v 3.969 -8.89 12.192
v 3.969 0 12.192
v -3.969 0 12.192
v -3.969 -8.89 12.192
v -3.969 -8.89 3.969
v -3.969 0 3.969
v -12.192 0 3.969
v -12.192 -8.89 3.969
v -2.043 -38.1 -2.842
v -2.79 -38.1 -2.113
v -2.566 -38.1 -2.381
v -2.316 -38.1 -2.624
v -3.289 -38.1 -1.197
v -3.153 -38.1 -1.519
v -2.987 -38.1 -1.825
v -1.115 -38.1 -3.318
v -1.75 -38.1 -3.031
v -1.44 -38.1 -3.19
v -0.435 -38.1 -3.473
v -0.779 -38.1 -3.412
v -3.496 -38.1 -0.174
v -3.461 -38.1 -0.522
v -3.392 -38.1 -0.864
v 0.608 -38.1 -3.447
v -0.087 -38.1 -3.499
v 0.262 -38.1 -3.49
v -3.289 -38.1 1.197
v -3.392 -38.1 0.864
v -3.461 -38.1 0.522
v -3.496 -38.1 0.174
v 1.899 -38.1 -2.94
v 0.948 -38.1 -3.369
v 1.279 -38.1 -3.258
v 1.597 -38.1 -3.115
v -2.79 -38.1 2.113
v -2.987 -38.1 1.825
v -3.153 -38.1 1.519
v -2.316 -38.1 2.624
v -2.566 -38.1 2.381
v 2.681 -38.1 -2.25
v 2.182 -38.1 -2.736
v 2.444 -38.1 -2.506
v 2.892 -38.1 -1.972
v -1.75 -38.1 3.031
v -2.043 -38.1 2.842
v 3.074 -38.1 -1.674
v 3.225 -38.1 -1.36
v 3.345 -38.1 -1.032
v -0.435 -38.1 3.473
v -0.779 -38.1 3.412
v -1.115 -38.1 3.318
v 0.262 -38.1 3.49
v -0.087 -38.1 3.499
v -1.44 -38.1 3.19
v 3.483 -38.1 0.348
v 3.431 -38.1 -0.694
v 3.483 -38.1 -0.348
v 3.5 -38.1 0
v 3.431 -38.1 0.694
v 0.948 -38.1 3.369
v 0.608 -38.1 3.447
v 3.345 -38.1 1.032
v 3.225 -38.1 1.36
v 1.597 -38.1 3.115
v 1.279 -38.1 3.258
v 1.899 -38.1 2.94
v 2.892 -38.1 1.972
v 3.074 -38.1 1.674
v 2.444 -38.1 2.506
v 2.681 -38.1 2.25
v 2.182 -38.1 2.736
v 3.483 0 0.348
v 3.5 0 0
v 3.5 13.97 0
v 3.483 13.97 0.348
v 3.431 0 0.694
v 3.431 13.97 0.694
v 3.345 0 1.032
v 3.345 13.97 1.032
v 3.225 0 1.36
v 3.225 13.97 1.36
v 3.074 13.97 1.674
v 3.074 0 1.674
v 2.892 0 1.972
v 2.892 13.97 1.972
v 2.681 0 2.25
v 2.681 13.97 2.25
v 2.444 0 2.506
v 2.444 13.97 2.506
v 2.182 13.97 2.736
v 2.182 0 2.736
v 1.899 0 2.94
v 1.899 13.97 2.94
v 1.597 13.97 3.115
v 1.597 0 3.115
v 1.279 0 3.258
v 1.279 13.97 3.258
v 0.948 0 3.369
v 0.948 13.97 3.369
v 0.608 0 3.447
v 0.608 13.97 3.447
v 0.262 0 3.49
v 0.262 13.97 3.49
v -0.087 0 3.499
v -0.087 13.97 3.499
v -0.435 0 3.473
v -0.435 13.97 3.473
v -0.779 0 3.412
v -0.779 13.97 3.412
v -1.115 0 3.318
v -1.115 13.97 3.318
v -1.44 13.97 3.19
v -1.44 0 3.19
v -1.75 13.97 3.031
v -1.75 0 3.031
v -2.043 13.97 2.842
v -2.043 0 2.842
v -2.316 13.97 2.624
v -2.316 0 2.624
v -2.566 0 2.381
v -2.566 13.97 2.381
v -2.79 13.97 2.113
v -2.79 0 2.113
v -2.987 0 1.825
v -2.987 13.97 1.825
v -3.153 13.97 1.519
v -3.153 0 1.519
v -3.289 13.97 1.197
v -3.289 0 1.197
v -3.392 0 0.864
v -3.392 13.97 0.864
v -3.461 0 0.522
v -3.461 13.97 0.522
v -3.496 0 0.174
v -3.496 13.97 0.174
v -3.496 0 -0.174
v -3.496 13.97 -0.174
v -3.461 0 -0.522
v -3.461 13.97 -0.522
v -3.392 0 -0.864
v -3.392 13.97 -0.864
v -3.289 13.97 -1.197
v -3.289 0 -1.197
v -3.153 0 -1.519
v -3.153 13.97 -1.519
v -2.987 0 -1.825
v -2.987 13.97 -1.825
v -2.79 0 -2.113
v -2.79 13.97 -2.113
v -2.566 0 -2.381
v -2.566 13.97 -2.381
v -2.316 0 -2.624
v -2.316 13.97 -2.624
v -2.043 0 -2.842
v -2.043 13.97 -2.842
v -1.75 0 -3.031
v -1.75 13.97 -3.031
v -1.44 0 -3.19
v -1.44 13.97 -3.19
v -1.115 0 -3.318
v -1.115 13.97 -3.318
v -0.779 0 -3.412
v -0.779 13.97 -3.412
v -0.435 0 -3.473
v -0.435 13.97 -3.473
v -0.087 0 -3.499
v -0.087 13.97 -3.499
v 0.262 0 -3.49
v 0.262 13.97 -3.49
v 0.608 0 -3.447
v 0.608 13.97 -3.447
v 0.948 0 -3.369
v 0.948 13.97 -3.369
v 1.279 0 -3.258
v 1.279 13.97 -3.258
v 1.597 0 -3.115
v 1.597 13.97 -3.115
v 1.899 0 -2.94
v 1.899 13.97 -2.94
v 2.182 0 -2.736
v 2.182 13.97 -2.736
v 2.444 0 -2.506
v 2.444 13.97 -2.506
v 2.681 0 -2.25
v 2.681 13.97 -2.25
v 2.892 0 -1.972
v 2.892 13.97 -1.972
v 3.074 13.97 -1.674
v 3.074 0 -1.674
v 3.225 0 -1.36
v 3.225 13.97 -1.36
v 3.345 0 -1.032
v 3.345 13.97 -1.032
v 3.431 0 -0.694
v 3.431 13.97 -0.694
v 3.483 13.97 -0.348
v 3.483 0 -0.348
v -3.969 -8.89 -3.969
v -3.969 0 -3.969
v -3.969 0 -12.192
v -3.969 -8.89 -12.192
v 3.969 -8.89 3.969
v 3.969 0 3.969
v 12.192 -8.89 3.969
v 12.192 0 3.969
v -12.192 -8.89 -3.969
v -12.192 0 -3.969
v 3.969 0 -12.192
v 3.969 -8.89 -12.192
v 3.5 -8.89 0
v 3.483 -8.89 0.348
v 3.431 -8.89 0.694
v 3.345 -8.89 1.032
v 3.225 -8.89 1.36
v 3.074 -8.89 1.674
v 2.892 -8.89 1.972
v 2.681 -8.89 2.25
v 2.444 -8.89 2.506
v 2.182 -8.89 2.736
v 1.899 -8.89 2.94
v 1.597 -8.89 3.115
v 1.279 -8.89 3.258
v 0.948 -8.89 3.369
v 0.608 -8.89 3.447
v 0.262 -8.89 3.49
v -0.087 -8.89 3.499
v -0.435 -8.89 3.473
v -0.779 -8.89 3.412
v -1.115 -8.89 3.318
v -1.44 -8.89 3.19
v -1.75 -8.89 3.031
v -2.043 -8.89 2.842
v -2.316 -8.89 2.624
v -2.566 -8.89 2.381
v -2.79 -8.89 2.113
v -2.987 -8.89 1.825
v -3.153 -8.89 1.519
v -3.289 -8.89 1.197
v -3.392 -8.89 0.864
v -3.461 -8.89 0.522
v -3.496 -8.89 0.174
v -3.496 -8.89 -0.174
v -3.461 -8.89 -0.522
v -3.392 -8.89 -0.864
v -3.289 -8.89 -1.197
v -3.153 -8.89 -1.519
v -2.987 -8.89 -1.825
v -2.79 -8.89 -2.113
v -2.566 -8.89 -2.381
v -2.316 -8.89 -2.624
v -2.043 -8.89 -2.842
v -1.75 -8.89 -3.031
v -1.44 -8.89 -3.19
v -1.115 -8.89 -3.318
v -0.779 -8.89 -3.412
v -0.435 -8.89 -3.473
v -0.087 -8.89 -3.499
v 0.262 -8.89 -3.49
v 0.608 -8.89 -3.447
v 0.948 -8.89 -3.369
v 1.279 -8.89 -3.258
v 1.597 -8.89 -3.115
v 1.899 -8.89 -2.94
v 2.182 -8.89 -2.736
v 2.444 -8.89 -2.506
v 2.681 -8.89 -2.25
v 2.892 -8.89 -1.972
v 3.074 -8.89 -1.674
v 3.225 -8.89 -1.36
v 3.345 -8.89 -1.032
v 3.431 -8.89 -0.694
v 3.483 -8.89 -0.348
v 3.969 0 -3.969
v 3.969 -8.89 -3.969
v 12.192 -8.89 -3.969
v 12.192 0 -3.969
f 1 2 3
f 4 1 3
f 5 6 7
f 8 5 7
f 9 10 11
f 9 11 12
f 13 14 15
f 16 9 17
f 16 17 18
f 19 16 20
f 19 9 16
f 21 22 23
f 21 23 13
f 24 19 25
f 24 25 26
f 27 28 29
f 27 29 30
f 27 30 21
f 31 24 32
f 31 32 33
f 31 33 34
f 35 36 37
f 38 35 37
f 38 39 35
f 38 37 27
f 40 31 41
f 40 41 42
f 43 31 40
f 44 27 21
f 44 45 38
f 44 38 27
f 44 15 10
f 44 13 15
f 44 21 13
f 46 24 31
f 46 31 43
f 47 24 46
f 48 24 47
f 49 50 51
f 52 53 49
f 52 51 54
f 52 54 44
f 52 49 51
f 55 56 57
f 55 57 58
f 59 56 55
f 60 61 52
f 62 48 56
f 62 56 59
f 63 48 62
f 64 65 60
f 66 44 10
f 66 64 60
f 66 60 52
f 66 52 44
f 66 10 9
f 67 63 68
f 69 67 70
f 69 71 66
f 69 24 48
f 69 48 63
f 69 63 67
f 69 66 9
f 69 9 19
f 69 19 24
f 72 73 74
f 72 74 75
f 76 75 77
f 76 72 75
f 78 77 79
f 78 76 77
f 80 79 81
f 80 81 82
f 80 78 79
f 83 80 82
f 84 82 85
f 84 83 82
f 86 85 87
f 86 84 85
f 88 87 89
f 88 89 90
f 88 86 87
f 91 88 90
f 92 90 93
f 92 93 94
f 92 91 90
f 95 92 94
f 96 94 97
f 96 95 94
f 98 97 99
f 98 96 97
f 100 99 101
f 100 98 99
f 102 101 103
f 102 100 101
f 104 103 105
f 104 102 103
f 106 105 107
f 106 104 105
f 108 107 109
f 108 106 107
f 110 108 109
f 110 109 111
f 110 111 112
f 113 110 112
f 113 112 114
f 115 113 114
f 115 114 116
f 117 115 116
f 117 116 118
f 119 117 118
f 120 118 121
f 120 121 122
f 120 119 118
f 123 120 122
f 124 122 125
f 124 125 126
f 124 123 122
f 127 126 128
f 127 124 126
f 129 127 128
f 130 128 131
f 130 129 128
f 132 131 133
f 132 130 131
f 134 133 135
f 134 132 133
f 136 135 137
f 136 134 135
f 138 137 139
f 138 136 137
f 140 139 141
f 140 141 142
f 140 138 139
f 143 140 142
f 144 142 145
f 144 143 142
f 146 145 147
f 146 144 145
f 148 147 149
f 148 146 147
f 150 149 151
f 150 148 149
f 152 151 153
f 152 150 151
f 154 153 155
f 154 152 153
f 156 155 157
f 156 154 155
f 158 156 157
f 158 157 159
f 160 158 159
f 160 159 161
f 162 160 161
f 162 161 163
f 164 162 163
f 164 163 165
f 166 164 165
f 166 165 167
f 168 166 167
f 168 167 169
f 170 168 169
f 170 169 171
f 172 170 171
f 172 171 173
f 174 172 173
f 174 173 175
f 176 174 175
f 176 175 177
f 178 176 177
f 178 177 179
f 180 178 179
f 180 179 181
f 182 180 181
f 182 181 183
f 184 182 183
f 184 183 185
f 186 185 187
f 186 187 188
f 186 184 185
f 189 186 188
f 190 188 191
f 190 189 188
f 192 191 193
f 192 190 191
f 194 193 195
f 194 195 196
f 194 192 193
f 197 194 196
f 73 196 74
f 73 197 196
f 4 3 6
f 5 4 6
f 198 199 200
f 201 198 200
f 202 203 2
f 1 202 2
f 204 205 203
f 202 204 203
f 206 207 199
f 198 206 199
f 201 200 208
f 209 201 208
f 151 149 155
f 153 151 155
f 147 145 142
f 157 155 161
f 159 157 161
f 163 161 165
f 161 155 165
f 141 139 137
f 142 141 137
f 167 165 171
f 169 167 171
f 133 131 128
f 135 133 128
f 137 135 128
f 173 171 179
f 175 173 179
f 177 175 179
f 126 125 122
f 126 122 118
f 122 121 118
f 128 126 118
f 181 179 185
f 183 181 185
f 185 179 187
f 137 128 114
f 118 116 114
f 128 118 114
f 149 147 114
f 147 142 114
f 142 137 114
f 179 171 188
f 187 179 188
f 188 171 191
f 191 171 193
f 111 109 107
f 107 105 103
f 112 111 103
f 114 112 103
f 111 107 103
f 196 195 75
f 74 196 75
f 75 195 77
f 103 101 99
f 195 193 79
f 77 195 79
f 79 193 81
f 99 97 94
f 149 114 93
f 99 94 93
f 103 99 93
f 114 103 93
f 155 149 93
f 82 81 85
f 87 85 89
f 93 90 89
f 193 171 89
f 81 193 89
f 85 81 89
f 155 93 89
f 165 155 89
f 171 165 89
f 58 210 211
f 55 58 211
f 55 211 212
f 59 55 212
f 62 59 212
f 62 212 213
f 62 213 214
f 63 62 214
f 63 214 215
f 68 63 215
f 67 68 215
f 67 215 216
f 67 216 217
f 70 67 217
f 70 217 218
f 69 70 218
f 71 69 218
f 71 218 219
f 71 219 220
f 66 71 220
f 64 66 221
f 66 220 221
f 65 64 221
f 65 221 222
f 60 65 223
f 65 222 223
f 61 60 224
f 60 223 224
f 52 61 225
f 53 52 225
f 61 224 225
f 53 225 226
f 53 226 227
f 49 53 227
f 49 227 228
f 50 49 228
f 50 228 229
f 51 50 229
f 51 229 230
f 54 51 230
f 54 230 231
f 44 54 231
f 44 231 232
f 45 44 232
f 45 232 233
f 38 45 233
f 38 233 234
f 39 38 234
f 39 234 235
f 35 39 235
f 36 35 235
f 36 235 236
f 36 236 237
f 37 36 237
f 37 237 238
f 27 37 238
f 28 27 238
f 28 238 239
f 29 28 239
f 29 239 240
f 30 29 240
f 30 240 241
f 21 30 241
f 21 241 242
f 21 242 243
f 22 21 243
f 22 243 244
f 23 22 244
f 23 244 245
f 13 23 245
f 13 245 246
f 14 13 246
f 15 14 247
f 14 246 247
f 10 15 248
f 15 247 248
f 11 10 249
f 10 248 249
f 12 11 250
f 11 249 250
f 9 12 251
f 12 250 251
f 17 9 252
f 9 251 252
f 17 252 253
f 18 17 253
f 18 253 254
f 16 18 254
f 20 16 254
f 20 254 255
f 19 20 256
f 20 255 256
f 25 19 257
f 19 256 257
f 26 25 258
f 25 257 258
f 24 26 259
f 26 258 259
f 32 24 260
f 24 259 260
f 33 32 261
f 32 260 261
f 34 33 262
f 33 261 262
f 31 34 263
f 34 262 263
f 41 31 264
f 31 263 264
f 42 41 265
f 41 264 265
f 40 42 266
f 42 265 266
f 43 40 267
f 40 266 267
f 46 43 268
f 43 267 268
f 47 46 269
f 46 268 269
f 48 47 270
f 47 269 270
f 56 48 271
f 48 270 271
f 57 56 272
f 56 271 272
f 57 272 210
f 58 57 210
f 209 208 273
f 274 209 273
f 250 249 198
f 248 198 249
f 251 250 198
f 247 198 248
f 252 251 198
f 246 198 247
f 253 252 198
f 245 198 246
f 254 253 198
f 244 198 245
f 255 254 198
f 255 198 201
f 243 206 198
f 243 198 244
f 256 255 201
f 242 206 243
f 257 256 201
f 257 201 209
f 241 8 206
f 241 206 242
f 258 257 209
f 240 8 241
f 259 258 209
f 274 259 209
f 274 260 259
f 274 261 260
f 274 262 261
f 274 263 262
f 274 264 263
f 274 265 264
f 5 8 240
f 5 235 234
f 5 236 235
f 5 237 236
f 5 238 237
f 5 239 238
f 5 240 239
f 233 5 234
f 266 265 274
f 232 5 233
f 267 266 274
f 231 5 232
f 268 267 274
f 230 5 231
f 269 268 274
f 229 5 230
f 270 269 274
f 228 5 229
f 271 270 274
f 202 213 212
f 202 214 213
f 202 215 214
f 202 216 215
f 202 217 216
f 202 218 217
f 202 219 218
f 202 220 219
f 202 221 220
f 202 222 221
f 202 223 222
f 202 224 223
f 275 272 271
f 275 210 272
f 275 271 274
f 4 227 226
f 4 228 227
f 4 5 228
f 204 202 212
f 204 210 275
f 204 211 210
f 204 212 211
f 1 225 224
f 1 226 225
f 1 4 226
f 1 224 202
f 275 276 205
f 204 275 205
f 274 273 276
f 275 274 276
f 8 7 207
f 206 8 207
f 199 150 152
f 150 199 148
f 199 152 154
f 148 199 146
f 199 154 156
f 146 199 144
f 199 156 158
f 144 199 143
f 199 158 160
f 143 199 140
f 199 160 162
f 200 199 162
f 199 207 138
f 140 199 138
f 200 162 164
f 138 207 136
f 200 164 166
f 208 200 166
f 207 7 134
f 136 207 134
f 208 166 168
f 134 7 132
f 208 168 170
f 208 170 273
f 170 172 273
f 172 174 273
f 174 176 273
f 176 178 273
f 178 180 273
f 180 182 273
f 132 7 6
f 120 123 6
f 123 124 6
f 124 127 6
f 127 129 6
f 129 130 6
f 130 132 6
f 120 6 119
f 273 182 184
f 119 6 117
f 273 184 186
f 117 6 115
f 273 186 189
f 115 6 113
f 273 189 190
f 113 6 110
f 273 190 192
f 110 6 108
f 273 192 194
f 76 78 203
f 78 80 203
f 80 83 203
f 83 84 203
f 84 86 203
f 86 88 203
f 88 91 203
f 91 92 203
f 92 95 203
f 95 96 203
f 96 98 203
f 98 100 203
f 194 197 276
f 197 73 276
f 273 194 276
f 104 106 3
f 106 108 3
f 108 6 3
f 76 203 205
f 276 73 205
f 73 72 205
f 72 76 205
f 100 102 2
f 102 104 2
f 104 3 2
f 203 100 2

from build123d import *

# Parameters (mm, degrees)
F0_R     = 3.5
F1_DEPTH = 8.89
F2_DEPTH = 38.1
F3_DEPTH = 13.97


with BuildPart() as f1:
    # F0 (on Front) → F1 (new body)
    with BuildSketch(Plane.XZ):
        Polygon((12.192, -3.96875), (12.192, 3.96875), (3.96875, 3.96875), (3.96875, 12.192), (-3.96875, 12.192), (-3.96875, 3.96875), (-12.192, 3.96875), (-12.192, -3.96875), (-3.96875, -3.96875), (-3.96875, -12.192), (3.96875, -12.192), (3.96875, -3.96875), align=None)
        Circle(F0_R, mode=Mode.SUBTRACT)
    extrude(amount=F1_DEPTH)

    # F0 (on Front) → F2 (join)
    with BuildSketch(Plane.XZ):
        Circle(F0_R)
    extrude(amount=F2_DEPTH)

    # F0 (on Front) → F3 (join)
    with BuildSketch(Plane.XZ):
        Circle(F0_R)
    extrude(amount=-F3_DEPTH)


solid = f1.part
